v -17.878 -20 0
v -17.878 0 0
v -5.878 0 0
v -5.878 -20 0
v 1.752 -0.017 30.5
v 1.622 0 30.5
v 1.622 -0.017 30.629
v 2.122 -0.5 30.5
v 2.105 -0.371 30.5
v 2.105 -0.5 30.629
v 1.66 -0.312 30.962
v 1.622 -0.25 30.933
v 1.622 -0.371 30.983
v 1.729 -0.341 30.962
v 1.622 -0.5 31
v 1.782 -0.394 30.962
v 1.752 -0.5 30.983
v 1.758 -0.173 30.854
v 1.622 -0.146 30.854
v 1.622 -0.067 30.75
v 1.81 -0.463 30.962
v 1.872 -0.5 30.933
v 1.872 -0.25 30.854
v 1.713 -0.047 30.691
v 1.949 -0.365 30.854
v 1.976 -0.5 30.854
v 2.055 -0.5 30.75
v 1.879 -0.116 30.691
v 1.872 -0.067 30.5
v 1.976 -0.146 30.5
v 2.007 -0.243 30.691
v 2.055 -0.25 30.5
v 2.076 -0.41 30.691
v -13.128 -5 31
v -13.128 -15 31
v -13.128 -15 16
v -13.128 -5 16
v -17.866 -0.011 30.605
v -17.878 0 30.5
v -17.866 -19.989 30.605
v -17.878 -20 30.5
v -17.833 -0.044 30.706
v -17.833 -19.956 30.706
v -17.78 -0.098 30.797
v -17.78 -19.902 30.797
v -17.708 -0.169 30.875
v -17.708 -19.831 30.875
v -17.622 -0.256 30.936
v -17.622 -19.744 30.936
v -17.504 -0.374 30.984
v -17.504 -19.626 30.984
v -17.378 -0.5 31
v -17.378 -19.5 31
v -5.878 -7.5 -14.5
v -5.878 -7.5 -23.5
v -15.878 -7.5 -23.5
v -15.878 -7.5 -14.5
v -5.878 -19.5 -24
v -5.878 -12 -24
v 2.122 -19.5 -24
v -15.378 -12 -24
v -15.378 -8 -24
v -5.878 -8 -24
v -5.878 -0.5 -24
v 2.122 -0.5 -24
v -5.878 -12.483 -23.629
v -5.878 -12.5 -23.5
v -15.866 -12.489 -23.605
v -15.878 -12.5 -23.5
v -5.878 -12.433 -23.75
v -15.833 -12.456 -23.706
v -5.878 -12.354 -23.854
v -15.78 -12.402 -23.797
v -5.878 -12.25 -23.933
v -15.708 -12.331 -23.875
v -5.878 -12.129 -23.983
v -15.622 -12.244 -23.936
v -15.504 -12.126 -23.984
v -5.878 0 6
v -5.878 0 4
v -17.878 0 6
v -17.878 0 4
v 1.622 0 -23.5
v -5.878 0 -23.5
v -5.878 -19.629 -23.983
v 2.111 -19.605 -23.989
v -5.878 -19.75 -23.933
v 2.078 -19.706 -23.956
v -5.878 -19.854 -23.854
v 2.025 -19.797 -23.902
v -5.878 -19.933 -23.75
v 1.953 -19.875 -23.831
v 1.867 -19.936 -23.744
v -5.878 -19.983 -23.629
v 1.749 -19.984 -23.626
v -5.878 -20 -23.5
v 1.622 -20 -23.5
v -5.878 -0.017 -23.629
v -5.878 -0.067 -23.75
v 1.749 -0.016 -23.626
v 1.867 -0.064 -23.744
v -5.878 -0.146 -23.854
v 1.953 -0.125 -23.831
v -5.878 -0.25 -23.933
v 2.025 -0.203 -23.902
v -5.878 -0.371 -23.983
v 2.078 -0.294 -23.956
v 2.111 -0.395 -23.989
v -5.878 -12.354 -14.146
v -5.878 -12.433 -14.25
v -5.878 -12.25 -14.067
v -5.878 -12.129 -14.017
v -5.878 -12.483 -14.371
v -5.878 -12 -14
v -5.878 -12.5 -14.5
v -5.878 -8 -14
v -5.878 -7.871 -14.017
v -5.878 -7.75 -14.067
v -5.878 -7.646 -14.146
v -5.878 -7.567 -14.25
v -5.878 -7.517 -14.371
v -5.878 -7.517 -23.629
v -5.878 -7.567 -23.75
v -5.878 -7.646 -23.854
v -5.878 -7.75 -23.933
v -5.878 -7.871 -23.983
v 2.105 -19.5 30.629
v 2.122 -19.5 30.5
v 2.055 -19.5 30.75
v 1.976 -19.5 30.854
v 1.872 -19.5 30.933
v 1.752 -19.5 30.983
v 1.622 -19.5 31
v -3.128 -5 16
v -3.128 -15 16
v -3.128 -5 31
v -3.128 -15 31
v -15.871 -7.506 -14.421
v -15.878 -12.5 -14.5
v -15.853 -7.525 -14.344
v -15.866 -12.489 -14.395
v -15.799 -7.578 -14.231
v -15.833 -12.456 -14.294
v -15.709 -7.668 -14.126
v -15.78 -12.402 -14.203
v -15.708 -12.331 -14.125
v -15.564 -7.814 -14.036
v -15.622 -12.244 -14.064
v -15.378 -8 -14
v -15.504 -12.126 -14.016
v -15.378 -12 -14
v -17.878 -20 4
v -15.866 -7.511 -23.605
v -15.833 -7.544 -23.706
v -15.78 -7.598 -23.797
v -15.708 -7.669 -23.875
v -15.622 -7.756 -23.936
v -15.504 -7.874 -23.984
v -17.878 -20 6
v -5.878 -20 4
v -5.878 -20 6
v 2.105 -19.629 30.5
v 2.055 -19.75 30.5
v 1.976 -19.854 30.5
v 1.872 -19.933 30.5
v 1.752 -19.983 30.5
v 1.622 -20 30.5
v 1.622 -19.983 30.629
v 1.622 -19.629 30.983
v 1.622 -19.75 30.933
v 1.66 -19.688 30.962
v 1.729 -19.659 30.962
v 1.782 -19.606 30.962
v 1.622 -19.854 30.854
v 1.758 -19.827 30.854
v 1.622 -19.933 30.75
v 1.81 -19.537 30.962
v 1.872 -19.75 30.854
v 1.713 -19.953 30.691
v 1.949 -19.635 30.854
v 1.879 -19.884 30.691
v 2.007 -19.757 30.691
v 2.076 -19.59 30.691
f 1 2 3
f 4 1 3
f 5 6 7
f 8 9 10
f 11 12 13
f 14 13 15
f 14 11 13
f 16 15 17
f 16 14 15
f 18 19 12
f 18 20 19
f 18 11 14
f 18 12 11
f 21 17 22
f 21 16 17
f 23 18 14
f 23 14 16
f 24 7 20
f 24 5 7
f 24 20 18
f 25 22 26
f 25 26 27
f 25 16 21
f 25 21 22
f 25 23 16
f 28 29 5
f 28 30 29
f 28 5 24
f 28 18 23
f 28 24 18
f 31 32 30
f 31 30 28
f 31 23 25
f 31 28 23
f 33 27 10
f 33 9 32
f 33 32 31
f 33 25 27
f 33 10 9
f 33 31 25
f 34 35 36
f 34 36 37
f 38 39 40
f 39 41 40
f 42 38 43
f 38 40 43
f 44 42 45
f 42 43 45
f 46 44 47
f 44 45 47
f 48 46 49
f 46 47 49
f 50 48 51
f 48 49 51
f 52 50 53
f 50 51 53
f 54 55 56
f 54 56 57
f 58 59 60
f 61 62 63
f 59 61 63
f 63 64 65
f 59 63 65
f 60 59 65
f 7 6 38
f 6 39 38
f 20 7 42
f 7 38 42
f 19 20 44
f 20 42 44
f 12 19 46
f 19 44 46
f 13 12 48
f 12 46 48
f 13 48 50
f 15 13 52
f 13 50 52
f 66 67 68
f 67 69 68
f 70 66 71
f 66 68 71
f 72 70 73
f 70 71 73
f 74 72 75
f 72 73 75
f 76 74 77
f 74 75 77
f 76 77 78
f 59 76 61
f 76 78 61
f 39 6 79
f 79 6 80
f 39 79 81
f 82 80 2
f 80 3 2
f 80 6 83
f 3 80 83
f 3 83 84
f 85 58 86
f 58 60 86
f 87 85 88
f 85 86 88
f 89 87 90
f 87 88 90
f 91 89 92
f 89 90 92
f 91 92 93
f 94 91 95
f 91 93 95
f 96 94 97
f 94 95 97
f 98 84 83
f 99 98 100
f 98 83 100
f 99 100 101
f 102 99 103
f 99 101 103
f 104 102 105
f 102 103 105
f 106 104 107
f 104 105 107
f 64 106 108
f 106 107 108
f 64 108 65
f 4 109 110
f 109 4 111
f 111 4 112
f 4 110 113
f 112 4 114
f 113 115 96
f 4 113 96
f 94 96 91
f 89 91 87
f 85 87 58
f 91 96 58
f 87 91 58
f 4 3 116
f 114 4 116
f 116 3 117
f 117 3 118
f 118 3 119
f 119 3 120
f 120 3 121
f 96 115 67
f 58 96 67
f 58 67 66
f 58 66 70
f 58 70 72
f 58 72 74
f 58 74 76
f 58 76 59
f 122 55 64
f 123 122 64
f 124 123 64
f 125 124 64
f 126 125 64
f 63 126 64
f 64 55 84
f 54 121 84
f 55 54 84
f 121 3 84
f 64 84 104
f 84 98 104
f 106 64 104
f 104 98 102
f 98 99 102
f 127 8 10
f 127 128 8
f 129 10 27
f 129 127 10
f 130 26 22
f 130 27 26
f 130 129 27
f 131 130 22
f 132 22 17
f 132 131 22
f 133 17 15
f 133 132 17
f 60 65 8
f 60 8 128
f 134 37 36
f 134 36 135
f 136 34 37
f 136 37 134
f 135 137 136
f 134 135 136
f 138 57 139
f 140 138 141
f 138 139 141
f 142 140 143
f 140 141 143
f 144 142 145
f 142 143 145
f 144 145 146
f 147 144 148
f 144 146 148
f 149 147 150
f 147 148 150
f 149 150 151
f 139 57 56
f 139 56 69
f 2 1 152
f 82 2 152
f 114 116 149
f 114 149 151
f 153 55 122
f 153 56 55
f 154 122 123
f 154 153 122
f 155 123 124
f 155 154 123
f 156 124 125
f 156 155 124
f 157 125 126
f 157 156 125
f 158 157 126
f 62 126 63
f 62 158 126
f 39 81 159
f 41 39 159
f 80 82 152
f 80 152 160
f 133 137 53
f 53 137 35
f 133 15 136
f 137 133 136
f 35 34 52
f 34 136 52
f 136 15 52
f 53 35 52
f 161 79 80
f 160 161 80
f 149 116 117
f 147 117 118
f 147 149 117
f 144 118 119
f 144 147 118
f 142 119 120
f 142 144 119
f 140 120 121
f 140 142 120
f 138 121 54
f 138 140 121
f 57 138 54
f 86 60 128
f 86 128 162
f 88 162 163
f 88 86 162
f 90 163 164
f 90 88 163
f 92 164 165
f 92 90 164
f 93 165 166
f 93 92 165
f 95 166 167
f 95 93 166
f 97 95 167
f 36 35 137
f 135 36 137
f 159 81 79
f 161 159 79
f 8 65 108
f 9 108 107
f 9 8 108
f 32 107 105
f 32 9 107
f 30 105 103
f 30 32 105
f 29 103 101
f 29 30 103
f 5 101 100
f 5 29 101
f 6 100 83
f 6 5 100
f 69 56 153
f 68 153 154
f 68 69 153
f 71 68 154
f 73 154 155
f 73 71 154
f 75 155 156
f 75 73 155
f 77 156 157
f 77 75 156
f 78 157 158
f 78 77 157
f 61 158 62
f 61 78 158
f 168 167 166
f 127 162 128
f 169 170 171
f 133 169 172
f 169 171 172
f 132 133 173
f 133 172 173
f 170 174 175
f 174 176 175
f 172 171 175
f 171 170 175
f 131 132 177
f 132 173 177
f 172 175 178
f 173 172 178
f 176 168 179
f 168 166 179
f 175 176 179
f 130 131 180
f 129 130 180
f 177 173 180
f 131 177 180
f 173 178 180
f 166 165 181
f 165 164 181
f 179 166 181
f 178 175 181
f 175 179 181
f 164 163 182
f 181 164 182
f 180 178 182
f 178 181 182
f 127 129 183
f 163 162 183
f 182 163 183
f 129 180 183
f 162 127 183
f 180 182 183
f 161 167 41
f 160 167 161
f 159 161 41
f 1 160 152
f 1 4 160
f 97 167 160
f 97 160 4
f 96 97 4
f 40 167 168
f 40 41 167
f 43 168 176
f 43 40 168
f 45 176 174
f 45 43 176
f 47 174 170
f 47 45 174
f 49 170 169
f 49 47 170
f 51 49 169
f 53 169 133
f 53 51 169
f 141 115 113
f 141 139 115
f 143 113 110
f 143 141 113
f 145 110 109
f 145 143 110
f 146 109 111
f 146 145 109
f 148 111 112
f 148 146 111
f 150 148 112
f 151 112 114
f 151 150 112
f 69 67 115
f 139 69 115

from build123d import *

# Parameters (mm, degrees)
F0_W     = 12
F0_H     = 4
F1_DEPTH = 20
F2_W     = 5
F2_H     = 10
F3_DEPTH = 10
F4_DEPTH = 20
F5_R     = 0.5
F6_W     = 10
F6_H     = 10
F7_DEPTH = 15


with BuildPart() as f1:
    # F0 (on Front) → F1 (new body)
    with BuildSketch(Plane.XZ):
        Polygon((2.1224494493, 11), (-17.8775505507, 11), (-17.8775505507, 6), (-5.8775505507, 6), (2.1224494493, 6), align=None)
        Polygon((2.1224494493, -24), (2.1224494493, 6), (-5.8775505507, 6), (-5.8775505507, 4), (-5.8775505507, 0), (-5.8775505507, -14), (-5.8775505507, -24), align=None)
        with Locations((-11.8775505507, 2)):
            Rectangle(F0_W, F0_H)
    extrude(amount=F1_DEPTH)

    # F2 (on face) → F3 (join)
    with BuildSketch(Plane(origin=(-5.8775505507, 0, 0), x_dir=(0, -1, 0), z_dir=(-1, 0, 0))):
        with Locations((10, -19)):
            Rectangle(F2_W, F2_H)
    extrude(amount=F3_DEPTH)

    # F4 (add): a face of the model
    f4_faces = [f1.faces().sort_by_distance(p)[0] for p in [
        (-7.8775505507, -10, 11),
    ]]
    extrude(f4_faces, amount=F4_DEPTH)

    # F5
    f5_edges = [f1.edges().sort_by_distance(p)[0] for p in [
        (2.122449, -20, 3.5),
        (2.122449, 0, 3.5),
        (-1.877551, -20, -24),
        (-1.877551, 0, -24),
        (-10.877551, -12.5, -14),
        (-10.877551, -7.5, -14),
        (-15.877551, -10, -14),
        (-15.877551, -10, -24),
        (-10.877551, -12.5, -24),
        (-10.877551, -7.5, -24),
        (-7.877551, -20, 31),
        (-17.877551, -10, 31),
        (-7.877551, 0, 31),
        (2.122449, -10, 31),
    ]]
    fillet(f5_edges, radius=F5_R)

    # F6 (on face) → F7 (cut)
    with BuildSketch(Plane.XY.offset(31)):
        with Locations((-8.1275505507, -10)):
            Rectangle(F6_W, F6_H)
    extrude(amount=-F7_DEPTH, mode=Mode.SUBTRACT)


solid = f1.part
